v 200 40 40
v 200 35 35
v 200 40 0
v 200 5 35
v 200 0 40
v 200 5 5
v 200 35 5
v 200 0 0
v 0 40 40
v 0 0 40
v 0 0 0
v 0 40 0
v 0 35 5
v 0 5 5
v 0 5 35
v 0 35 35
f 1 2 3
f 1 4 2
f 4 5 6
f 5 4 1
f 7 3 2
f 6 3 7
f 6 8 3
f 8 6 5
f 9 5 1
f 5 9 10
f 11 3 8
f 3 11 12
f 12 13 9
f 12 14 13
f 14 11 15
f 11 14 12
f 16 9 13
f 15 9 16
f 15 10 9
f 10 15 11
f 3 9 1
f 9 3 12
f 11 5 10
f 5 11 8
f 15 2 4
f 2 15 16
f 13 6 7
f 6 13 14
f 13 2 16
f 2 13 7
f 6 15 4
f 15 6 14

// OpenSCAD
$fn = 32;

// ----------------------------------------------------------------------
// Box beam: 200-250 mm hollow beam
// ----------------------------------------------------------------------

// --- parameters (mm) ---
beam_l = 200;             // beam length, X
beam_w = 40;              // beam width, Y
beam_h = 40;              // beam height, Z
wall = 5;                 // wall thickness

difference() {
  cube([beam_l, beam_w, beam_h]);
  translate([-1, wall, wall])
    cube([beam_l + 2, beam_w - 2 * wall, beam_h - 2 * wall]);
}
